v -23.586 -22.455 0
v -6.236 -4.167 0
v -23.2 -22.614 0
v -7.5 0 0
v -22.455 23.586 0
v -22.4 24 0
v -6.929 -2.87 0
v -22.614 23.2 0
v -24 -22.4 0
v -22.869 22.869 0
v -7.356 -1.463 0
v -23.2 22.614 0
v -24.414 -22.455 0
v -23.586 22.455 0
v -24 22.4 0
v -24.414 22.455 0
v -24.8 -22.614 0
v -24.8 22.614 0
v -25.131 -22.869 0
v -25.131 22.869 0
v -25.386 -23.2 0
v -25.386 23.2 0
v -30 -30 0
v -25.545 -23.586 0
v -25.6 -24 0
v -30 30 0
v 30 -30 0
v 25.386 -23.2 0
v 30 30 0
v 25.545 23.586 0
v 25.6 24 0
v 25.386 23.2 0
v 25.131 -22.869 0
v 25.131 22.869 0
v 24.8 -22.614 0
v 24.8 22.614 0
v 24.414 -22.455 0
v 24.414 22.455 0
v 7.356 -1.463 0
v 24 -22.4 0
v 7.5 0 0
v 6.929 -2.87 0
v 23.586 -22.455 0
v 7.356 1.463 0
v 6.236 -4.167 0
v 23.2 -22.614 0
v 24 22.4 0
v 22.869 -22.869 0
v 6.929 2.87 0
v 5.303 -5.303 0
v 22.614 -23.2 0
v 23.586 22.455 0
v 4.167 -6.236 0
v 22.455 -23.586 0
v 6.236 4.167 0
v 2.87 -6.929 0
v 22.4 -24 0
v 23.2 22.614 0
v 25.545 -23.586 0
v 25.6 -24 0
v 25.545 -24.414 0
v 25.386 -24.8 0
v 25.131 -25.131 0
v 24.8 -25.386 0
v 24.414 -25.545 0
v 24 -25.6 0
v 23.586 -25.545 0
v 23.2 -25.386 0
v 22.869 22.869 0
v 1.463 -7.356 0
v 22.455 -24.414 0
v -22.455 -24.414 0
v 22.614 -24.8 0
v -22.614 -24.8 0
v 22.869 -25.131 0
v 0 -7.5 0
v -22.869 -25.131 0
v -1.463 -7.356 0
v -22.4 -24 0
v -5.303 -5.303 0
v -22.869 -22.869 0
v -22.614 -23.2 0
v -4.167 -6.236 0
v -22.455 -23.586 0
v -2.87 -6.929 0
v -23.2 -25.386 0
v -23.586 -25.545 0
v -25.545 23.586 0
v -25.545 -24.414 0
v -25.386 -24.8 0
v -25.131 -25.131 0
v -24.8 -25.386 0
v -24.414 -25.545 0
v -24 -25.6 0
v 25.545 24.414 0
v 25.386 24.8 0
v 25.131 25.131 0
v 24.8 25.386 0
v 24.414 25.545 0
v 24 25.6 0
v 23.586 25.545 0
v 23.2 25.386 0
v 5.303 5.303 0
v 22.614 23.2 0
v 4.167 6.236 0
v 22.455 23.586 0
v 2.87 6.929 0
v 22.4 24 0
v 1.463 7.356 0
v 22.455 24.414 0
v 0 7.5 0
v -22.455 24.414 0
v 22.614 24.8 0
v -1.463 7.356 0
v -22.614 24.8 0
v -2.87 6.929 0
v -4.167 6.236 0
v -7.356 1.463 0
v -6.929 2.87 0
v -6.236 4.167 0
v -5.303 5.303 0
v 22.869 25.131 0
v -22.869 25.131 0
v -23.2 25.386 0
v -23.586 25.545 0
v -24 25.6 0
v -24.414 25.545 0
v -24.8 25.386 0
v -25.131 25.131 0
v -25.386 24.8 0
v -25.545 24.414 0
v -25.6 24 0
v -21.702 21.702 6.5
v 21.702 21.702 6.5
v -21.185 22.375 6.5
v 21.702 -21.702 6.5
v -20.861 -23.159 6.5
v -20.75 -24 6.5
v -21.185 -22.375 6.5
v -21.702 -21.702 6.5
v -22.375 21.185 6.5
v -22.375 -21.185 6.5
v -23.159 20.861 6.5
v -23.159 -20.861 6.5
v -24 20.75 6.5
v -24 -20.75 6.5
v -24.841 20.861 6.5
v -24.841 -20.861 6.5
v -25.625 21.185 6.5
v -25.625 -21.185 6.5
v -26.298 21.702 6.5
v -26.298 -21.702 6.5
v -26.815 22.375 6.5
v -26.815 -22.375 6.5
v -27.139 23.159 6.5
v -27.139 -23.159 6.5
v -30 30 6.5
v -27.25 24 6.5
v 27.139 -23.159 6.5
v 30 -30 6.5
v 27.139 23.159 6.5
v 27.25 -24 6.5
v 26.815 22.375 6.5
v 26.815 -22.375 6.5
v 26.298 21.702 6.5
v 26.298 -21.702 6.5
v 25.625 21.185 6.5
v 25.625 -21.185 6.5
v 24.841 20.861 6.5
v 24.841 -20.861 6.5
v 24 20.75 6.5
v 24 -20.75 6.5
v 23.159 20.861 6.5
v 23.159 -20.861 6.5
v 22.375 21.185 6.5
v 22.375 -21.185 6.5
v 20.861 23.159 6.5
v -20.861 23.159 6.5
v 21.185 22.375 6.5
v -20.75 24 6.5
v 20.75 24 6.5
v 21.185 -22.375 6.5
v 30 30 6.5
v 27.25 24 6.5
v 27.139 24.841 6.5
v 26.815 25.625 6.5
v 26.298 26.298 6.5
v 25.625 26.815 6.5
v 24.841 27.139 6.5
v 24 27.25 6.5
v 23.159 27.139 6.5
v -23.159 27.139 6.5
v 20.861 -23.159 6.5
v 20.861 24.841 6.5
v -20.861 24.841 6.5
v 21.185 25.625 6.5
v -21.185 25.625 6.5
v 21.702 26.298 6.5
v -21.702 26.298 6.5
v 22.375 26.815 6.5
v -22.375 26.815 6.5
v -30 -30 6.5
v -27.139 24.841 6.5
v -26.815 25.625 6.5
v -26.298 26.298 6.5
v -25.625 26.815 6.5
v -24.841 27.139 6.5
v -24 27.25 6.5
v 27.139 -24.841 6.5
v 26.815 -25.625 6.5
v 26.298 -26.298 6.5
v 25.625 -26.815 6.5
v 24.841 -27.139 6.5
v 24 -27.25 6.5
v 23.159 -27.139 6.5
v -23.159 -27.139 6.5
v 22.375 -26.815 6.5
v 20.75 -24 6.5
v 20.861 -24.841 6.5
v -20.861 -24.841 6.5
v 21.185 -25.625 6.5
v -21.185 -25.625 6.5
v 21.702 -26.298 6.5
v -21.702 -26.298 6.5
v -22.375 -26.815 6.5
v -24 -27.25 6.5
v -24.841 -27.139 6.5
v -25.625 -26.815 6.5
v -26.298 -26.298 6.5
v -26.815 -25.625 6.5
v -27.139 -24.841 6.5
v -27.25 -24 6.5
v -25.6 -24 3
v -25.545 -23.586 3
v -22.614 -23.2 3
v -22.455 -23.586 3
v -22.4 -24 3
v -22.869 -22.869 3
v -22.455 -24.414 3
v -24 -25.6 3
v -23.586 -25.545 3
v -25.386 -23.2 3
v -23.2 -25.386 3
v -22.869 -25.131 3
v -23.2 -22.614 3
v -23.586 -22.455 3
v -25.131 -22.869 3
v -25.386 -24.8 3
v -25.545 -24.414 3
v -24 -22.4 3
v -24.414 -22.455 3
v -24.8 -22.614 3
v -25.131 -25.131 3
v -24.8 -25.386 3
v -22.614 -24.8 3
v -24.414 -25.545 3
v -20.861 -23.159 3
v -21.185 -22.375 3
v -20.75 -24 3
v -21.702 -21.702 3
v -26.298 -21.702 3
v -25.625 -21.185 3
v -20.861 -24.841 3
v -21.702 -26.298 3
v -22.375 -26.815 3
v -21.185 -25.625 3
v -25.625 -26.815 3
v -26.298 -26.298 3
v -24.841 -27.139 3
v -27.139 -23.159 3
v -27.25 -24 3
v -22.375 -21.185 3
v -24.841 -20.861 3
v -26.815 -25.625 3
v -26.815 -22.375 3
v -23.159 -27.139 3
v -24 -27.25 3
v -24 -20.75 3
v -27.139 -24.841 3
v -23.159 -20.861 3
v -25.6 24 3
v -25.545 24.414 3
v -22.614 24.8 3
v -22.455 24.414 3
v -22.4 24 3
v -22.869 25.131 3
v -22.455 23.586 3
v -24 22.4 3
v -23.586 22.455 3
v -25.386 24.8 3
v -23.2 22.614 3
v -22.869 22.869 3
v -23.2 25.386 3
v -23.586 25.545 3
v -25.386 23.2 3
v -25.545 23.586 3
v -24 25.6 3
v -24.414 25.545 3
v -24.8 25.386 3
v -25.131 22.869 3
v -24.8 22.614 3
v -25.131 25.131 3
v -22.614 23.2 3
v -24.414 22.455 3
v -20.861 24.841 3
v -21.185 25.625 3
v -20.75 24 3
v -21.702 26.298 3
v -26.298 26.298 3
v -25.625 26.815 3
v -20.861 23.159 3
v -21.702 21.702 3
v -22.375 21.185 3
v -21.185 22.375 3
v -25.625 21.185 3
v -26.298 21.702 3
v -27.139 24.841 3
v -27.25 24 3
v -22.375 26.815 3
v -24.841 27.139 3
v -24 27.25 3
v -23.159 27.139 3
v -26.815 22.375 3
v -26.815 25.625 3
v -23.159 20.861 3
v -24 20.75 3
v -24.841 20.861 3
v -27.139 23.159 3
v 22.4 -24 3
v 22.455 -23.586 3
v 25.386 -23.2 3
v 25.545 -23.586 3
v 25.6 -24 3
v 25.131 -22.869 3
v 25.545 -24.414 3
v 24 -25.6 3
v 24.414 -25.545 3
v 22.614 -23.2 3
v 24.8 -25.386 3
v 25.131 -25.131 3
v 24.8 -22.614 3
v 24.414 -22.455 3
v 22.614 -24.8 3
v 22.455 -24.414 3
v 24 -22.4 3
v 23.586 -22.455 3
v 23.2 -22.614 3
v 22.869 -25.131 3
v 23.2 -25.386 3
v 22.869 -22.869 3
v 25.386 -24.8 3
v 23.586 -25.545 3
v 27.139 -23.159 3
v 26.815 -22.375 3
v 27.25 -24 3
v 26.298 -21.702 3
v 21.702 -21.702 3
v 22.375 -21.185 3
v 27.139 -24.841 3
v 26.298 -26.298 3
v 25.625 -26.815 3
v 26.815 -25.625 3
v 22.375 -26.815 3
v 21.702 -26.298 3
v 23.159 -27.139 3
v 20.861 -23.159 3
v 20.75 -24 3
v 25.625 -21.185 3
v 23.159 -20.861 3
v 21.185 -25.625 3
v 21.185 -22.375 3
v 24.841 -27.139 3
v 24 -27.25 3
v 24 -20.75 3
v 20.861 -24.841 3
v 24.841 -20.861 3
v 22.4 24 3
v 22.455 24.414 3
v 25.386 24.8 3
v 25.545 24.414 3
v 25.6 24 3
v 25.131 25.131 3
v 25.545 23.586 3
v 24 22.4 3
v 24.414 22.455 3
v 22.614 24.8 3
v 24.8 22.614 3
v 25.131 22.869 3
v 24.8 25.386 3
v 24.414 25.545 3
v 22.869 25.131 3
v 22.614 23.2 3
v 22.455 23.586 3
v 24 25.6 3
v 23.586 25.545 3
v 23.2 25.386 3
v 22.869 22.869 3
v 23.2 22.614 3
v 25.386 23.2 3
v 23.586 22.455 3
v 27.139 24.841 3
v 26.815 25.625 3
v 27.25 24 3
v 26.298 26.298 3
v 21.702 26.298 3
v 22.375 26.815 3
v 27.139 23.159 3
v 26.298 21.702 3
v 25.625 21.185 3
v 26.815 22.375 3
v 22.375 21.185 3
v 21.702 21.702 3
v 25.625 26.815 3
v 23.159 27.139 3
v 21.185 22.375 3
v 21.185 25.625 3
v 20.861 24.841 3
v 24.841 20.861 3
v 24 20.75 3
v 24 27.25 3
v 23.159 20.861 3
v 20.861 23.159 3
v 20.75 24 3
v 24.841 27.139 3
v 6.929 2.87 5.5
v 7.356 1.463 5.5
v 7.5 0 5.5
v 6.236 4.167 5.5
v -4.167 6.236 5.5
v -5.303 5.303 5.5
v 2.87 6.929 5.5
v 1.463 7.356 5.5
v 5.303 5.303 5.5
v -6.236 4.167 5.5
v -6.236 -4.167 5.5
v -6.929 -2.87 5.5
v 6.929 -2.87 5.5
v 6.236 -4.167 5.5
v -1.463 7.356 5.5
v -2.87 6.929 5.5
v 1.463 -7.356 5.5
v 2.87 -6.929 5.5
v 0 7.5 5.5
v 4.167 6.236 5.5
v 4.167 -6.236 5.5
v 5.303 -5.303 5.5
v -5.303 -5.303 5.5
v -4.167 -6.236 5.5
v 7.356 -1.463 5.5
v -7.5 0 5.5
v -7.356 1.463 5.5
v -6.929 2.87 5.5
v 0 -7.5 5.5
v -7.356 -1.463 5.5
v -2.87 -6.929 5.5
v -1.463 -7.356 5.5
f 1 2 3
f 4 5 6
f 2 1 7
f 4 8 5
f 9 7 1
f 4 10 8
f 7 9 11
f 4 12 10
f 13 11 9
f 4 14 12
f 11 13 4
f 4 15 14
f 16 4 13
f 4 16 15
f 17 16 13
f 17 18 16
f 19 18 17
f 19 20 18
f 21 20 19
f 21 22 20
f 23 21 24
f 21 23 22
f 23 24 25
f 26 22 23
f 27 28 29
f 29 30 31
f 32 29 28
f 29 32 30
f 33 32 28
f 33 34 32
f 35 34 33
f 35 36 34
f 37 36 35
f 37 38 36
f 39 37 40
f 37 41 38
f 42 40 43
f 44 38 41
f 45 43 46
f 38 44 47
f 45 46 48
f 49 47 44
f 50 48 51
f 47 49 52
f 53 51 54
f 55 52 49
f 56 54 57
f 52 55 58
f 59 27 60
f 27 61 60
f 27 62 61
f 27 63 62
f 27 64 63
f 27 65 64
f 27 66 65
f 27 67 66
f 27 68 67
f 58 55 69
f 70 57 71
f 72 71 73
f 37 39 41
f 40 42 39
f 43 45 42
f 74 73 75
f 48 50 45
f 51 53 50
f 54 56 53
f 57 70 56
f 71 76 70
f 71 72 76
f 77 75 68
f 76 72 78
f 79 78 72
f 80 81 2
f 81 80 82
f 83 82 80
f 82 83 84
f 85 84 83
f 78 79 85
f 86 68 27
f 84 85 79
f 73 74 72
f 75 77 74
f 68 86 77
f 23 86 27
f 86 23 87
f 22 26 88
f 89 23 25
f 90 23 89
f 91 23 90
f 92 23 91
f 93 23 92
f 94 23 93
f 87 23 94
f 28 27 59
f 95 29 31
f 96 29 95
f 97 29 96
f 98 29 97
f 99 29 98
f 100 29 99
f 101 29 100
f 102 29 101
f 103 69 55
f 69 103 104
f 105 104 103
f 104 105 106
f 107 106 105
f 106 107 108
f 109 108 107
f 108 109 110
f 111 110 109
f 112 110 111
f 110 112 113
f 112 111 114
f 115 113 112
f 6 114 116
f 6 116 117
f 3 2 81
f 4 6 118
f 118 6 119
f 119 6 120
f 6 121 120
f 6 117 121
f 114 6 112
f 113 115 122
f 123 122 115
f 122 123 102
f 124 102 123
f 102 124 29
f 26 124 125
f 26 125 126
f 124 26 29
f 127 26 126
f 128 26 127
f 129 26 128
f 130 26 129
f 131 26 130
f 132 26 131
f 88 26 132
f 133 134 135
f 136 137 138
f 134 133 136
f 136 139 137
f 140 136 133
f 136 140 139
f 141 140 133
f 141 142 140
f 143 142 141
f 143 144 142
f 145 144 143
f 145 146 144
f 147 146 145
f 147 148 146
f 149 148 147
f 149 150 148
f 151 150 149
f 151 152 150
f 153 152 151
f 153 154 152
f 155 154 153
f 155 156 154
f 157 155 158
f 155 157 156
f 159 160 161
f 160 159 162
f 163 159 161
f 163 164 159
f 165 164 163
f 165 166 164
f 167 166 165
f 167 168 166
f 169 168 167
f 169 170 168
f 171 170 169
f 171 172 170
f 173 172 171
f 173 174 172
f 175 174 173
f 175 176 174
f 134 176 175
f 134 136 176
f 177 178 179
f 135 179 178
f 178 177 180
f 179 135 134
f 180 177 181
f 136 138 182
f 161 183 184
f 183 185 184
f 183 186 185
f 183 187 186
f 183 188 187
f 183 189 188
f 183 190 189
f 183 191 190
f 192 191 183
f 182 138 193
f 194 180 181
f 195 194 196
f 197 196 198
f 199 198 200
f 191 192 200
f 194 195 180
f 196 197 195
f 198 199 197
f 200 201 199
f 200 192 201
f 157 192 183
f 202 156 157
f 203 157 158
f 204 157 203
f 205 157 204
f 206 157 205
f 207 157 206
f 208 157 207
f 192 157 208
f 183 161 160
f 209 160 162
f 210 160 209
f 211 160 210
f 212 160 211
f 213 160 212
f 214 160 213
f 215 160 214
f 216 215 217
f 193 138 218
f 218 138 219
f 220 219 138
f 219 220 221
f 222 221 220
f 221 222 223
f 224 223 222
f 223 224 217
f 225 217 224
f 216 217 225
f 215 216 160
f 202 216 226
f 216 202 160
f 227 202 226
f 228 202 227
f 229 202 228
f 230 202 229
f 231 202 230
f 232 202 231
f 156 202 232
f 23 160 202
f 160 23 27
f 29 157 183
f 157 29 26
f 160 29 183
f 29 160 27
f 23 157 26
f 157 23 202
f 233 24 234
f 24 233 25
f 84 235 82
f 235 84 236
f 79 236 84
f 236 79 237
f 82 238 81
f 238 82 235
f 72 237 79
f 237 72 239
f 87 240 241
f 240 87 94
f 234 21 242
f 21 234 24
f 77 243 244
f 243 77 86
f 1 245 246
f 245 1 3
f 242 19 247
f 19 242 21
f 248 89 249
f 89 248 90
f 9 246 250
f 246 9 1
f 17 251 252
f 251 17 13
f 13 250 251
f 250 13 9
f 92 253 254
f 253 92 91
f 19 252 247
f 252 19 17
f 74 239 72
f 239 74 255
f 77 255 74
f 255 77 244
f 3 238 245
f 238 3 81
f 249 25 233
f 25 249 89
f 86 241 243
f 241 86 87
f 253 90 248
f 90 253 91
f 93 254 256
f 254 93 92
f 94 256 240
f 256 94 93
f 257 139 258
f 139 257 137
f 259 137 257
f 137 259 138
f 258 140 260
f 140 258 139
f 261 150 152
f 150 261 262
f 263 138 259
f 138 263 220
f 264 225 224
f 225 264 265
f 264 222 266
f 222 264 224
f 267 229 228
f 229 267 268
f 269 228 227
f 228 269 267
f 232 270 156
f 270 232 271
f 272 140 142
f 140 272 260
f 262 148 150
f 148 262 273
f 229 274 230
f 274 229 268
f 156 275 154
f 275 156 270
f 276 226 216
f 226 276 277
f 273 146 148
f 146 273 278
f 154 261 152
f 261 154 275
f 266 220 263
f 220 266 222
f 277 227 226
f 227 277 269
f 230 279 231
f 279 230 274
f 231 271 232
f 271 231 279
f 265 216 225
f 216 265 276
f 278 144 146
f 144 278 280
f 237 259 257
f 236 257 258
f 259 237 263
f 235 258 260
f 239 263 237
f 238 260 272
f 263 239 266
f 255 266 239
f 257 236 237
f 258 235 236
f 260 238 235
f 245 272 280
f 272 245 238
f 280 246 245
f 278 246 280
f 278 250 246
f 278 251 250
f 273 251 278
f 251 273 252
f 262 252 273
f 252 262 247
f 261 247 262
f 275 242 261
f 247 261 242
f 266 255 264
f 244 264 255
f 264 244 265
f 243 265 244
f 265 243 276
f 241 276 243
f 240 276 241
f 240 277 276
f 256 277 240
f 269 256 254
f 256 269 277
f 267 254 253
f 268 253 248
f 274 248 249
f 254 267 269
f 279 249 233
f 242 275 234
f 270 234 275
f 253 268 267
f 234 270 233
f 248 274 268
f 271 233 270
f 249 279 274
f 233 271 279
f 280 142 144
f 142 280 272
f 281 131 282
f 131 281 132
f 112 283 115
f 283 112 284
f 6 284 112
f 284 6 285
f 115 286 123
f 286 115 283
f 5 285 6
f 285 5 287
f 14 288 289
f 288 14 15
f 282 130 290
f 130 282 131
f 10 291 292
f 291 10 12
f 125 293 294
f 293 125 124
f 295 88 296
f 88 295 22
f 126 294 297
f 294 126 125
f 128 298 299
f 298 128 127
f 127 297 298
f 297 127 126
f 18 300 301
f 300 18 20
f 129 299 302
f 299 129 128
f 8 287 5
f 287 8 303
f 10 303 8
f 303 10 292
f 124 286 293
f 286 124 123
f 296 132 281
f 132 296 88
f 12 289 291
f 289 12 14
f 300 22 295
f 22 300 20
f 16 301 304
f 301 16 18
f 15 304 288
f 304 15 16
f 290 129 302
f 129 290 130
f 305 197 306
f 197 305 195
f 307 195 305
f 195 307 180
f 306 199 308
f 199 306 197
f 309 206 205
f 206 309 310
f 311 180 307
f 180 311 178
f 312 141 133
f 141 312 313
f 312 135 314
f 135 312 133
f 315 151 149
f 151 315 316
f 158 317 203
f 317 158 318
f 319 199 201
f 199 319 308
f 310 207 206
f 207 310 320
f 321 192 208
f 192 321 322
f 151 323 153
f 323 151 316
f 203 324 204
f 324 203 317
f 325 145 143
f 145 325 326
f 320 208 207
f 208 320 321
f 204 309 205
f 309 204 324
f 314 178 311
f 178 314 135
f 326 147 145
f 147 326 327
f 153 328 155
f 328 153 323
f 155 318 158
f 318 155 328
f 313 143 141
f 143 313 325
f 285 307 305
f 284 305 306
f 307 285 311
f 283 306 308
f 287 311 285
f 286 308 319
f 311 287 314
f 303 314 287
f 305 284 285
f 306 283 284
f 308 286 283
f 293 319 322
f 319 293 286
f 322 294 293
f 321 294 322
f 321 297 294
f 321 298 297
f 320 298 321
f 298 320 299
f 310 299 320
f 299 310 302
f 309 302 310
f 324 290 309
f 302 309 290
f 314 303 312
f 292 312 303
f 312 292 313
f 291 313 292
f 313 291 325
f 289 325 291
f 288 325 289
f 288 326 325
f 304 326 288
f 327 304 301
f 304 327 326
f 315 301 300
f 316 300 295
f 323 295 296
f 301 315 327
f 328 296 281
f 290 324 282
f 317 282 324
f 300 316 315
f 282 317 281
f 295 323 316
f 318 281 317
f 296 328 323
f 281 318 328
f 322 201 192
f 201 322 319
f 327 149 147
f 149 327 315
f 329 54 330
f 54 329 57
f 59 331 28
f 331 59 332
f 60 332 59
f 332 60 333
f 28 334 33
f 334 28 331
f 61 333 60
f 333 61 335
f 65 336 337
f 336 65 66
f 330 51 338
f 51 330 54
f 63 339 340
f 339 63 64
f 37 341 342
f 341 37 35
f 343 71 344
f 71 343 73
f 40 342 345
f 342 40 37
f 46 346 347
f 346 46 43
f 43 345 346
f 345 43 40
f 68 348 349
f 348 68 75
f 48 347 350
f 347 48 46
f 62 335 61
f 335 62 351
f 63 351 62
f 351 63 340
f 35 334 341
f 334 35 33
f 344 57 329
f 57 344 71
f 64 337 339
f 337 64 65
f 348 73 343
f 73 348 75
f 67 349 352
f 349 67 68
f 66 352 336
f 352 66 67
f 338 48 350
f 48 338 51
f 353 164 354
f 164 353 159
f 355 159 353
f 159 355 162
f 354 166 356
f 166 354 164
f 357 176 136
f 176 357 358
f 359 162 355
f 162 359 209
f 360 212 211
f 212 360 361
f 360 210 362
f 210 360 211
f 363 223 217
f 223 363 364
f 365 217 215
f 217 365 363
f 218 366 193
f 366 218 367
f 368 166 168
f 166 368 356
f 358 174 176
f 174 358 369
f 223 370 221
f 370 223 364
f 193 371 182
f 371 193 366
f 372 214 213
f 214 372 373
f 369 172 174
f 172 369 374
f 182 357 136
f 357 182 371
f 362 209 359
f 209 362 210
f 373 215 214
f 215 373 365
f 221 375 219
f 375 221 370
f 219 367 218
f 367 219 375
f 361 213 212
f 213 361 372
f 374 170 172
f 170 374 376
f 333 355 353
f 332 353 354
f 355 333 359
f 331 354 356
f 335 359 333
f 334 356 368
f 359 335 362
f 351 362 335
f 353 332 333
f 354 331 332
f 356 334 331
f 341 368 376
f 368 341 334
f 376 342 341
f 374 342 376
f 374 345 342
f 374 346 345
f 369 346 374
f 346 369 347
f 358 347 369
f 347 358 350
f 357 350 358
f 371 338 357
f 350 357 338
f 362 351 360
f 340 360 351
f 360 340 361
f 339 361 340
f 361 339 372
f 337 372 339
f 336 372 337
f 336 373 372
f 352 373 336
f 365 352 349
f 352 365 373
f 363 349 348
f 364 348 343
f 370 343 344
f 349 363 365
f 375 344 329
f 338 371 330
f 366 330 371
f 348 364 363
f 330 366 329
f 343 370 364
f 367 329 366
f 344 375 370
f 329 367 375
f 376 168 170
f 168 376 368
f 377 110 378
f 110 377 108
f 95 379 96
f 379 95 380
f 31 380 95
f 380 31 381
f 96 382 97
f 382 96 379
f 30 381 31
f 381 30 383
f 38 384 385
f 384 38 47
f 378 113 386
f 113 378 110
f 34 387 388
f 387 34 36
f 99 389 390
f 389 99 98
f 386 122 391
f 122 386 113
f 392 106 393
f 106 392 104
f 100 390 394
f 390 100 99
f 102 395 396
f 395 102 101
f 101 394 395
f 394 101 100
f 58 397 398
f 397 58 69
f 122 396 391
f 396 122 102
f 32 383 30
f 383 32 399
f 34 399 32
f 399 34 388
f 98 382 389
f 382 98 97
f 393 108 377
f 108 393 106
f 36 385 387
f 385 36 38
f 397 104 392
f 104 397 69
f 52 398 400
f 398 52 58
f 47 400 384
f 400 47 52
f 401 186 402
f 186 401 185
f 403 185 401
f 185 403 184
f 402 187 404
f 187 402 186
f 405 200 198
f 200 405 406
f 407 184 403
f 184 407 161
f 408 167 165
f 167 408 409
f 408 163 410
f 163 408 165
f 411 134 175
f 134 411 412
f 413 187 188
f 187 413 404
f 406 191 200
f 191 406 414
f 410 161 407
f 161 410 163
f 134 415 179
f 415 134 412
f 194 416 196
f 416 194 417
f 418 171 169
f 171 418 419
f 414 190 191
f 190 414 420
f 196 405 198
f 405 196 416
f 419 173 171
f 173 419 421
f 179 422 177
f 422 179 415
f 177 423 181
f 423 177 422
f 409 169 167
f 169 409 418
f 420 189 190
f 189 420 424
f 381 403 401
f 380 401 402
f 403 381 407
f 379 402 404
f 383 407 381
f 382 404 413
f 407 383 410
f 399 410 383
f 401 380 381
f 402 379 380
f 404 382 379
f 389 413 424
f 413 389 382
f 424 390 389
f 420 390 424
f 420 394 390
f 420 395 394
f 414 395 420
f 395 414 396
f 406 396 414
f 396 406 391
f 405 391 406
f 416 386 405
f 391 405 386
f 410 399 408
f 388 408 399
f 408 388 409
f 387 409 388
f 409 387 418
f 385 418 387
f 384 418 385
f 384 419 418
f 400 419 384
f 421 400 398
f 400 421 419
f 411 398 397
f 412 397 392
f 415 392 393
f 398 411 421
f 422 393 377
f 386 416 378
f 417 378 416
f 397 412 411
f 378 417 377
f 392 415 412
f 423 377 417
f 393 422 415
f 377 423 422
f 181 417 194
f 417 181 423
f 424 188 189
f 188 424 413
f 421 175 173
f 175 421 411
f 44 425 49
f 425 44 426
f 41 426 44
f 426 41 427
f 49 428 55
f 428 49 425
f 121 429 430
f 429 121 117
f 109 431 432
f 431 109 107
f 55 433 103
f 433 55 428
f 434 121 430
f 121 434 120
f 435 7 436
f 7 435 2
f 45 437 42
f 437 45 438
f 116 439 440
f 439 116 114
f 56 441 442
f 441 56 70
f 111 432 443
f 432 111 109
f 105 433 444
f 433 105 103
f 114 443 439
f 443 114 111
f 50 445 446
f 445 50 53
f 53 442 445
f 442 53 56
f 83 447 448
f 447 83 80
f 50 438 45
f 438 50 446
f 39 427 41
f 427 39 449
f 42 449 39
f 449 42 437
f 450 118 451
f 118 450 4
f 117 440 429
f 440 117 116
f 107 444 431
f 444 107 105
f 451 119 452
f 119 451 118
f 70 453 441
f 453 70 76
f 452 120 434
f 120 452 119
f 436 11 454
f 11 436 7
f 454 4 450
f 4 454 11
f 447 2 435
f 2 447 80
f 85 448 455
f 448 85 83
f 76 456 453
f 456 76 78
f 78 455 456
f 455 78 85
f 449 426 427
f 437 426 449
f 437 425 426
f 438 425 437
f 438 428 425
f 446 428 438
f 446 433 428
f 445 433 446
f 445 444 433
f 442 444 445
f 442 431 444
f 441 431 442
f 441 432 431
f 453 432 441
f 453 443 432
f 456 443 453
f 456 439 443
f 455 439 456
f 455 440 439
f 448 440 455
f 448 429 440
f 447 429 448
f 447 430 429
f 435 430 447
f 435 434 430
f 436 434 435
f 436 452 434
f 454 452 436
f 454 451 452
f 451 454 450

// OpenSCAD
// ==========================================
// Xentient Framework - Anchor: Wall Plate Adapter
// Plugs into Rear Universal Anchor (40mm circular recess)
// Per Framework §5
// ==========================================
// Component: Male cylinder (40mm dia) with cross-keys
//            Flares to 60×60mm flat plate with 4× M3 countersunk holes
// Material: PETG (structural)
// Units: mm

$fn = 64;

// ==========================================
// ANCHOR DIMENSIONS (matching hub rear)
// ==========================================

Anchor_Dia   = 40.0;    // Male cylinder diameter
Anchor_Depth = 6.0;     // Insertion depth into hub
Anchor_Key_W = 10.0;    // Anti-rotation cross-key width
Anchor_Key_H = Anchor_Depth;  // Key height matches depth

// Wall plate dimensions
Plate_W      = 60.0;    // Square plate width
Plate_T      = 6.0;     // Plate thickness
M3_CSK_Dia  = 6.5;     // M3 countersunk head diameter
M3_Hole_Dia = 3.2;     // M3 screw hole diameter
CSK_Depth   = 3.0;     // Countersink depth
Hole_Offset = 24.0;    // Hole offset from center (24mm = 48mm span)

// Wire routing
Wire_Hole_D = 15.0;    // Central wire routing hole diameter

// ==========================================
// MODULE: anchor_wall_plate()
// ==========================================

module anchor_wall_plate() {
    difference() {
        union() {
            // Male cylinder (plugs into hub rear)
            cylinder(h=Anchor_Depth, d=Anchor_Dia, $fn=64);

            // Anti-rotation cross-keys (2 perpendicular ridges)
            for (a = [0, 90]) {
                rotate([0, 0, a])
                    translate([0, -Anchor_Key_W/2, 0])
                        cube([Anchor_Dia/2 + 2, Anchor_Key_W, Anchor_Key_H]);
            }

            // Transition from cylinder to square plate
            hull() {
                cylinder(h=1, d=Anchor_Dia + 4, $fn=64);
                translate([0, 0, Plate_T])
                    cube([Plate_W, Plate_W, 1], center=true);
            }

            // Wall plate
            translate([0, 0, Plate_T / 2])
                cube([Plate_W, Plate_W, Plate_T], center=true);
        }

        // Anti-rotation keyways in hub (matching grooves)
        // These are cut from the cylinder — the hub has matching channels

        // Central wire routing hole (for USB power through drywall)
        translate([0, 0, -1])
            cylinder(h=Anchor_Depth + Plate_T + 2, d=Wire_Hole_D, $fn=32);

        // 4× M3 countersunk holes
        for (sx = [-1, 1], sy = [-1, 1]) {
            translate([sx * Hole_Offset, sy * Hole_Offset, 0]) {
                // Through hole
                translate([0, 0, -1])
                    cylinder(h=Anchor_Depth + Plate_T + 2, d=M3_Hole_Dia, $fn=24);
                // Countersink (on outer face)
                translate([0, 0, Plate_T - CSK_Depth])
                    cylinder(h=CSK_Depth + 1, d=M3_CSK_Dia, $fn=24);
            }
        }

        // Draft angle on cylinder for easier insertion
        // (1° taper on cylinder outer surface)
    }

    // 1° draft taper on cylinder (additive ridge at base for wedge fit)
    translate([0, 0, Anchor_Depth - 0.5])
        cylinder(h=1, d1=Anchor_Dia, d2=Anchor_Dia + 1.0, $fn=64);
}

// ==========================================
// RENDER
// ==========================================

anchor_wall_plate();
